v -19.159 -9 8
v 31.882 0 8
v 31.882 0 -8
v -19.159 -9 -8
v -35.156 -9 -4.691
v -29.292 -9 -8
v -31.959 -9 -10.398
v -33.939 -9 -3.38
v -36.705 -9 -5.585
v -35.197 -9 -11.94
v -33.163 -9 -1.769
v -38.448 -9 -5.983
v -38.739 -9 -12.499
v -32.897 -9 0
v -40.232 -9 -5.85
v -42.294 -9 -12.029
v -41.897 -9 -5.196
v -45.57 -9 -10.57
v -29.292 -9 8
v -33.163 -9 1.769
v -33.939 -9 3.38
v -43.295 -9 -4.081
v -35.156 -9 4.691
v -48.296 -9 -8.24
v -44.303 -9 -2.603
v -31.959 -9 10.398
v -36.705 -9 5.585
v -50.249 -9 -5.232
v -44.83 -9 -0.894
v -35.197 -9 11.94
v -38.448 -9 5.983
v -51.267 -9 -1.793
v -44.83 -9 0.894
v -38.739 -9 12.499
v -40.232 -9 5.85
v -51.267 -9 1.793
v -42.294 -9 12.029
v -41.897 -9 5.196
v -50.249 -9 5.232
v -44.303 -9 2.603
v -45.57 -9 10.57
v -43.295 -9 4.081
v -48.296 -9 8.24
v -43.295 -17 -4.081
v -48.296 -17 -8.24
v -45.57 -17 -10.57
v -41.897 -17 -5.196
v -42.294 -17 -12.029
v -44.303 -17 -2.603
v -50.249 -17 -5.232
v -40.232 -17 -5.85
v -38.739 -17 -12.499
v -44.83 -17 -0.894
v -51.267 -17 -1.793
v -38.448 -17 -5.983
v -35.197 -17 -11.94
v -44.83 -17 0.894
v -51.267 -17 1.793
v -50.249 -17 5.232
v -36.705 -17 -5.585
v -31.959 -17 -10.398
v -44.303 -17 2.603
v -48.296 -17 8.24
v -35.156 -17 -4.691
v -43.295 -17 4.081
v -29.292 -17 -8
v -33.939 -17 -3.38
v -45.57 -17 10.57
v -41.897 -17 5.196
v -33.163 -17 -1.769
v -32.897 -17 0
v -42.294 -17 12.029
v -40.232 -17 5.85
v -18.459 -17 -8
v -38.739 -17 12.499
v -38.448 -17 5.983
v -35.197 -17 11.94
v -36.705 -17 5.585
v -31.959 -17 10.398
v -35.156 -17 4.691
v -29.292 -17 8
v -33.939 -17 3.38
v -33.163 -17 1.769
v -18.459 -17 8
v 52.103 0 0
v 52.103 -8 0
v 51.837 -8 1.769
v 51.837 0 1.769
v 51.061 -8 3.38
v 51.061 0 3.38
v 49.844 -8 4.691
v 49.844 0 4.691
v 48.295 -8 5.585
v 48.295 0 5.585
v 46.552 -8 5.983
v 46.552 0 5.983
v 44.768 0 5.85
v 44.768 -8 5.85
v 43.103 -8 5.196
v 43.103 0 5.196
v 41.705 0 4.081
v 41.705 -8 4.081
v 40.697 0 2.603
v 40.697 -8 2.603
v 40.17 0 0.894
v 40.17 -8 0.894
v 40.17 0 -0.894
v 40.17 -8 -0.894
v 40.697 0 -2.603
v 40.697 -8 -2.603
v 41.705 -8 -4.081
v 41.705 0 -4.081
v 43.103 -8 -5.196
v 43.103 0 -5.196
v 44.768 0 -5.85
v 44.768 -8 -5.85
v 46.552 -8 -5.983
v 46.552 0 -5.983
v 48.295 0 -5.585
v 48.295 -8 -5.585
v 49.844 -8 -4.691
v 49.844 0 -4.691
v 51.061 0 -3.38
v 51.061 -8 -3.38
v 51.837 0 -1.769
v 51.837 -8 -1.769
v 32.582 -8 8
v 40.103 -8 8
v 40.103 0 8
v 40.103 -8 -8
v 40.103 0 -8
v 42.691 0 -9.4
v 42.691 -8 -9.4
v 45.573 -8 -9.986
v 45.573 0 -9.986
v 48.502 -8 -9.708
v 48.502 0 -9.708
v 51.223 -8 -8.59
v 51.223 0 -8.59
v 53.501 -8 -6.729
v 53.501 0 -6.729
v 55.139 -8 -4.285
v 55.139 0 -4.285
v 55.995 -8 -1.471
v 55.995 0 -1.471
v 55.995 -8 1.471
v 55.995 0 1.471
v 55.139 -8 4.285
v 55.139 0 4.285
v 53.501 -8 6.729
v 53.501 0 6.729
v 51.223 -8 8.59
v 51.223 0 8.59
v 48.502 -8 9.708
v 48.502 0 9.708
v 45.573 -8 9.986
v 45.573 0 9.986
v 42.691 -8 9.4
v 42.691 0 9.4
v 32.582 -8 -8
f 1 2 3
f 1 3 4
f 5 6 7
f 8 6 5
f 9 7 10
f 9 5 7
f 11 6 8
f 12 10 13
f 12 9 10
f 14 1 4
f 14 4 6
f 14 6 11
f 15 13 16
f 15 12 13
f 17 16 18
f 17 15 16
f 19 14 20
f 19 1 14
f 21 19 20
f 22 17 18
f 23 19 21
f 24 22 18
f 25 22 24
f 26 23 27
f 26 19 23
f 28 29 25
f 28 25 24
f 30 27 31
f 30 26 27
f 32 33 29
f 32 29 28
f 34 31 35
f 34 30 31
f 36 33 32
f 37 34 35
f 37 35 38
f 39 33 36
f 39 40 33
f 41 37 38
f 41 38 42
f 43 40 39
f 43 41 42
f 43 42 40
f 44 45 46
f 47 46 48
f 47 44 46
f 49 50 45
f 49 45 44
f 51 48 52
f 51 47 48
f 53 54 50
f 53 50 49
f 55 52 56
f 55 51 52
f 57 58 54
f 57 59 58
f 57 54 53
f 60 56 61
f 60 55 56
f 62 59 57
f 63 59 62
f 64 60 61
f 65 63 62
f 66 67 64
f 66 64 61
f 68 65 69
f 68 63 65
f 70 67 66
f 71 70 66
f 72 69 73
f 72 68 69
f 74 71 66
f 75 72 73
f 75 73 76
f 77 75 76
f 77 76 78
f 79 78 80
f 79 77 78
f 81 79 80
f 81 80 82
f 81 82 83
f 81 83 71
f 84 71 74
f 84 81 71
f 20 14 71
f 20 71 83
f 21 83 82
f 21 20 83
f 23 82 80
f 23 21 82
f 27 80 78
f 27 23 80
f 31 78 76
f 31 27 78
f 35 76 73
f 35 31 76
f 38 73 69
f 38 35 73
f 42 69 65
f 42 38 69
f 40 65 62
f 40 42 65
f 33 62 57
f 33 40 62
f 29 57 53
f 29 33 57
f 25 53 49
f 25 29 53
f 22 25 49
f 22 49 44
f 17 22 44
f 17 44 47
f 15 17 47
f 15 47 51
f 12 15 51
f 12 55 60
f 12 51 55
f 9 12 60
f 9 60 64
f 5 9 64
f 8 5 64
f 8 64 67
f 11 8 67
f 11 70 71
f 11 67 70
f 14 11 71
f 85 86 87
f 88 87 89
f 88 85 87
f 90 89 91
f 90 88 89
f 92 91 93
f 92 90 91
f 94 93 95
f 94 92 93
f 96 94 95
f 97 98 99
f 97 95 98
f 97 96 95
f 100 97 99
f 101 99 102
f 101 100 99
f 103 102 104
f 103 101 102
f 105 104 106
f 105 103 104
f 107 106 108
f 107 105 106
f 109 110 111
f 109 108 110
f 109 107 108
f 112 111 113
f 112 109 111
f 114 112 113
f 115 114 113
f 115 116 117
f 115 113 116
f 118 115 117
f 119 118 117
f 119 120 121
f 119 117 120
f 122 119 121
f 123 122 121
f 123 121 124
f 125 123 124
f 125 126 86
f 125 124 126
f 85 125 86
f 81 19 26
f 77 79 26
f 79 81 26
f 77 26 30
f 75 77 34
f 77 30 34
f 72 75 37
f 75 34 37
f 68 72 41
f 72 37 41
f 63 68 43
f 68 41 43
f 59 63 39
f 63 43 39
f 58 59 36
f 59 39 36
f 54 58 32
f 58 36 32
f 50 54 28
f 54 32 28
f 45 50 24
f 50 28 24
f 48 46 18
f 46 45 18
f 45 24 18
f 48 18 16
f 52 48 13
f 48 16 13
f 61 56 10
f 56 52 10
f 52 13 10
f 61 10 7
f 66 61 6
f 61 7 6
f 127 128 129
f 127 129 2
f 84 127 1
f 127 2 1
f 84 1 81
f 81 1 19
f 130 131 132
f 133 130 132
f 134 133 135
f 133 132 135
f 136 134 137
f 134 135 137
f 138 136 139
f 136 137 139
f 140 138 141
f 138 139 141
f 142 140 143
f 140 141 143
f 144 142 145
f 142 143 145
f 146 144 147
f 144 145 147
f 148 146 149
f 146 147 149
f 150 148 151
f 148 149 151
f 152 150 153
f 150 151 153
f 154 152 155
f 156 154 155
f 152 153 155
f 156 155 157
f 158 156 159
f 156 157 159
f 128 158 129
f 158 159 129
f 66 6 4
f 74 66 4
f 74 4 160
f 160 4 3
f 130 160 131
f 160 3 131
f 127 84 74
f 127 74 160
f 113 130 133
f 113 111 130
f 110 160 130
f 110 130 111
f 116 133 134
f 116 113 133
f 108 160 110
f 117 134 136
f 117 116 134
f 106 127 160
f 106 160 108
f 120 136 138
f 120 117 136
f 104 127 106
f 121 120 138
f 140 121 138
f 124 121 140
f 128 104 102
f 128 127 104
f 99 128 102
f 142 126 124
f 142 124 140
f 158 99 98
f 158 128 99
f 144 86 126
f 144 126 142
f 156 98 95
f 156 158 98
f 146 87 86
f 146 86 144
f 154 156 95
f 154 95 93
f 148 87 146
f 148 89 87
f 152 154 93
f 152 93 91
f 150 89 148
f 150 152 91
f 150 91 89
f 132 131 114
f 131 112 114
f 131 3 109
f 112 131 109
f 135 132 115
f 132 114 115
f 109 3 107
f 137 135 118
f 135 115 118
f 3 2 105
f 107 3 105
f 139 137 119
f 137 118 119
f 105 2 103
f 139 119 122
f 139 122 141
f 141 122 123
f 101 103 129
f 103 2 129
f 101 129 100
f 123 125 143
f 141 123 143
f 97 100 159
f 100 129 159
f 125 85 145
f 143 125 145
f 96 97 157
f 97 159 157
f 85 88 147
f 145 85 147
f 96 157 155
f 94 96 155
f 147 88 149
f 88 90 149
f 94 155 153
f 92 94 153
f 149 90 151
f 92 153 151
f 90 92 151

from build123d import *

# Parameters (mm, degrees)
F0_R     = 6
F1_DEPTH = 25
F3_DEPTH = 12.5


with BuildPart() as f1:
    # F0 (on Front) → F1 (new body)
    with BuildSketch(Plane.XZ):
        with BuildLine():
            Line((40.103297, 8), (-29.292017, 8))
            ThreePointArc((-29.292017, 8), (-51.396703, 0), (-29.292017, -8))
            Line((-29.292017, -8), (40.103297, -8))
            ThreePointArc((40.103297, -8), (56.103297, 0), (40.103297, 8))
        make_face()
        with Locations((-38.896703, 0)):
            Circle(F0_R, mode=Mode.SUBTRACT)
        with Locations((46.103297, 0)):
            Circle(F0_R, mode=Mode.SUBTRACT)
    extrude(amount=F1_DEPTH)

    # F2 (on Top) → F3 (intersect, symmetric)
    with BuildSketch(Plane.XY):
        Polygon((-19.159218, -9), (-51.396703, -9), (-51.396703, -17), (-18.459309, -17), (32.582227, -8), (56.103297, -8), (56.103297, 0), (31.882318, 0), align=None)
    extrude(amount=F3_DEPTH, both=True, mode=Mode.INTERSECT)


solid = f1.part
